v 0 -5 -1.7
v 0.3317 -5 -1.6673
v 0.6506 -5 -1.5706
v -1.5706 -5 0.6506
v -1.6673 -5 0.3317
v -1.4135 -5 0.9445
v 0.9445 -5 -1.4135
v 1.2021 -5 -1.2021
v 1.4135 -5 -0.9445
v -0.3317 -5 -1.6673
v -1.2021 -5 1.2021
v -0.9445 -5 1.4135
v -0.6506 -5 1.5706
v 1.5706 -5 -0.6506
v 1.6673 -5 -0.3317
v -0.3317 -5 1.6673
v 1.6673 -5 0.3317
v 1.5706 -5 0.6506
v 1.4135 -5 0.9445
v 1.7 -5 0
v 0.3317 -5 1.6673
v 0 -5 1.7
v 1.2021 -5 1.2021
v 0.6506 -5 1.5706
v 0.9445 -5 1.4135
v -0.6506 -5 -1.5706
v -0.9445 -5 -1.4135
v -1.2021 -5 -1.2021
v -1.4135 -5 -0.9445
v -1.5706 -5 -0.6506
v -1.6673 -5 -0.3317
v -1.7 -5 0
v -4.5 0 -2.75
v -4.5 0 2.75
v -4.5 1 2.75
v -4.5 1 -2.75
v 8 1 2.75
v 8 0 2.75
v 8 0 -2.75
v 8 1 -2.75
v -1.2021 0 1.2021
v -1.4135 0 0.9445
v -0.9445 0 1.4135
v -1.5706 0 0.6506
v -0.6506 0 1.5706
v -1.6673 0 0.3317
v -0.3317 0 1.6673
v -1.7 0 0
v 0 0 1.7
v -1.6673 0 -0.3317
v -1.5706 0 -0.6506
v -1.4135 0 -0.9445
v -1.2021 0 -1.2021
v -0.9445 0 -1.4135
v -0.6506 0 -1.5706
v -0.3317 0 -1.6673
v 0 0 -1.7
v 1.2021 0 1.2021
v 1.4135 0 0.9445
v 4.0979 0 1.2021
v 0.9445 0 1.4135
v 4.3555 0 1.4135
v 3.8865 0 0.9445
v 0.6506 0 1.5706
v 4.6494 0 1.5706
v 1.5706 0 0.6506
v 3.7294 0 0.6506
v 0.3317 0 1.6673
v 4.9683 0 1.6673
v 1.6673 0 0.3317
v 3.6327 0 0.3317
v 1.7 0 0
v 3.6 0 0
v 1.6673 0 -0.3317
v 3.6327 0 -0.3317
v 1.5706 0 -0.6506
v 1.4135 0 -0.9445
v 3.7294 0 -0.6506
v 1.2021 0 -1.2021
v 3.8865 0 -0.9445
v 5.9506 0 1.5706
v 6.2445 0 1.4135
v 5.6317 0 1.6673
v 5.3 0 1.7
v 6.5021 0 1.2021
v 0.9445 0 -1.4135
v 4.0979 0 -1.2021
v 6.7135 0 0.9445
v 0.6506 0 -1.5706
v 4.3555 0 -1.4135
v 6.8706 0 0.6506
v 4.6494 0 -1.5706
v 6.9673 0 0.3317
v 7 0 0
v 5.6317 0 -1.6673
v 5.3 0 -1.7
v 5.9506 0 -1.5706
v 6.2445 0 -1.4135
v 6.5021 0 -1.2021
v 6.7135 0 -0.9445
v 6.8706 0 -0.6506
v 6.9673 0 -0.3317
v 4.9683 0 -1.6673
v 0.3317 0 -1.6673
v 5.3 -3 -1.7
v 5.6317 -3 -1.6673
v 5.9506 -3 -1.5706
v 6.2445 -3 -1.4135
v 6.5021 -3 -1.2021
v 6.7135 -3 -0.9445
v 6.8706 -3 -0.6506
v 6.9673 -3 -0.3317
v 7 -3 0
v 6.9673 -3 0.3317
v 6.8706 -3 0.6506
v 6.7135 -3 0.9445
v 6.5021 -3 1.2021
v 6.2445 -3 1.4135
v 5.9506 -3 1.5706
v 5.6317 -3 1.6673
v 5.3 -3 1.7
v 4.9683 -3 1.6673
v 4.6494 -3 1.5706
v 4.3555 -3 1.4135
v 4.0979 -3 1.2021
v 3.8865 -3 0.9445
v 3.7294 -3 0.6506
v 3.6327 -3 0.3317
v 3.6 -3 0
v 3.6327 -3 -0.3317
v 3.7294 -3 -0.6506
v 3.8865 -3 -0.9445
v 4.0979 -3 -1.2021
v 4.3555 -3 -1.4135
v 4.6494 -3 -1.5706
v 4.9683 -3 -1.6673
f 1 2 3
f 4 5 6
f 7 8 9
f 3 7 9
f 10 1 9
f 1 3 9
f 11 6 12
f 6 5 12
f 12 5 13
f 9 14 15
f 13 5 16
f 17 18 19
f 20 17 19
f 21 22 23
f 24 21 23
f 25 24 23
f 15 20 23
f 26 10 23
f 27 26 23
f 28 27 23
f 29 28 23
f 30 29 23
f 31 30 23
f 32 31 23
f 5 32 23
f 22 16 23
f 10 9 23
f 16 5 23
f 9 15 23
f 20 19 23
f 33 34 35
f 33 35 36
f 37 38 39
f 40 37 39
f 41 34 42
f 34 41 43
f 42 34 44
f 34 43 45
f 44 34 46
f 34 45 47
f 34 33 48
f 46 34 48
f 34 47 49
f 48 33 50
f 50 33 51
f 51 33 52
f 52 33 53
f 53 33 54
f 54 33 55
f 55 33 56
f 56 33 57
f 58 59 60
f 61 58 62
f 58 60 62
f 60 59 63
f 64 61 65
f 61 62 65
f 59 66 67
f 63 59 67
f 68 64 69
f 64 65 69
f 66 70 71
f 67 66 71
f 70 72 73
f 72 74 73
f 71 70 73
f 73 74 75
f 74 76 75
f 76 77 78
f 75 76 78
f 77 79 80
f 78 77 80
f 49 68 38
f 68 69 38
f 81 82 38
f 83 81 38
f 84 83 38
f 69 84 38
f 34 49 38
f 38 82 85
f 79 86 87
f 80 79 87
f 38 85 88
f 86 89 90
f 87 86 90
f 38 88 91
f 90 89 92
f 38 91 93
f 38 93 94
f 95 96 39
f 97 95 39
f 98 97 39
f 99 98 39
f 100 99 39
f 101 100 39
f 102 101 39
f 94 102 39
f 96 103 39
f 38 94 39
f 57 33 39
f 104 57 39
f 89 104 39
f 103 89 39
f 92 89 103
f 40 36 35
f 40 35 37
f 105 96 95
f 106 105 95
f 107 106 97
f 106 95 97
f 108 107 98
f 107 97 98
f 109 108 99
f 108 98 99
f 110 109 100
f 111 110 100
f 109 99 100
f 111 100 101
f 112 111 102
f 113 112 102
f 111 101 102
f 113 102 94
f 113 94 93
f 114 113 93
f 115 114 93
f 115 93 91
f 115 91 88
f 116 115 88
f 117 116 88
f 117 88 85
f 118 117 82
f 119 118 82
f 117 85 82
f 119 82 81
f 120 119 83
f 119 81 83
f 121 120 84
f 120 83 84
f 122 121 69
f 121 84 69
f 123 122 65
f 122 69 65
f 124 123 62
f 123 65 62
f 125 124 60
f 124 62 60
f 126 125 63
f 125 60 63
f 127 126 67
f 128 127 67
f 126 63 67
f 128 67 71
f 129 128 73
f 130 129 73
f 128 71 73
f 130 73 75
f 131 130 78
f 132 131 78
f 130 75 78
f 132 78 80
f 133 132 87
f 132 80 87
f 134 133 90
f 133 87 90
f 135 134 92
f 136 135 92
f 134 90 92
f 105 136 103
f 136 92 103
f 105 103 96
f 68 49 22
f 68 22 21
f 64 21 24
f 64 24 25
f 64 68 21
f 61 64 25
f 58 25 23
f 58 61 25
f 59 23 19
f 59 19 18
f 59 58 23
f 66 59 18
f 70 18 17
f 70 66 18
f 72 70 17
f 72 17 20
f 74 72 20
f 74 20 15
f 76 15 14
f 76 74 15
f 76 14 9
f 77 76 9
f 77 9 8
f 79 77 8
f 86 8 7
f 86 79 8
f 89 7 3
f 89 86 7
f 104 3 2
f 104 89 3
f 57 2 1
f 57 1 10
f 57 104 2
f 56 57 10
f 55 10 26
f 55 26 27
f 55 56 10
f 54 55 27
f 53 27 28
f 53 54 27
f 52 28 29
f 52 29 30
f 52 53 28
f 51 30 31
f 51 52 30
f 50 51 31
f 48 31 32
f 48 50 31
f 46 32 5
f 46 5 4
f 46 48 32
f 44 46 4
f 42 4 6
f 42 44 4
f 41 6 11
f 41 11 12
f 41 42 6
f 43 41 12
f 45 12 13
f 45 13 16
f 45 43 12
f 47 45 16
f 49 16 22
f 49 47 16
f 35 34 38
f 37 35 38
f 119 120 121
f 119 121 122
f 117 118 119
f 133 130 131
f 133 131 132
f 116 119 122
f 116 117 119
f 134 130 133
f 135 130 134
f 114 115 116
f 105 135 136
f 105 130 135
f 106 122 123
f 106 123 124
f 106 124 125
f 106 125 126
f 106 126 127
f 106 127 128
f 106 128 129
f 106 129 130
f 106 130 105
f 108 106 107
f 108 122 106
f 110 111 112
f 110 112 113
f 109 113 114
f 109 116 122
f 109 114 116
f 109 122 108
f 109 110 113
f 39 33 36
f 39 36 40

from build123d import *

# Parameters (mm, degrees)
SKETCH_2_R      = 1.7
EXTRUDE_1_DEPTH = 5
SKETCH_9_W      = 12.5
SKETCH_9_H      = 5.5
EXTRUDE_5_DEPTH = 1
SKETCH_11_R     = 1.7
EXTRUDE_6_DEPTH = 3


with BuildPart() as part:
    # 草图2 → 凸台-拉伸1 (new body)
    with BuildSketch(Plane(origin=(0, 0, 0), x_dir=(1, 0, 0), z_dir=(0, 1, 0))):
        with Locations(Location((0, 0, 0), (0, 0, 270))):
            Circle(SKETCH_2_R)
    extrude(amount=-EXTRUDE_1_DEPTH)

    # 草图9 → 凸台-拉伸5 (add)
    with BuildSketch(Plane(origin=(0, 0, 0), x_dir=(1, 0, 0), z_dir=(0, 1, 0))):
        with Locations((1.75, 0)):
            Rectangle(SKETCH_9_W, SKETCH_9_H)
    extrude(amount=EXTRUDE_5_DEPTH)

    # 草图11 → 凸台-拉伸6 (add)
    with BuildSketch(Plane.XZ):
        with Locations(Location((5.3, 0, 0), (0, 0, 270))):
            Circle(SKETCH_11_R)
    extrude(amount=EXTRUDE_6_DEPTH)


solid = part.part
